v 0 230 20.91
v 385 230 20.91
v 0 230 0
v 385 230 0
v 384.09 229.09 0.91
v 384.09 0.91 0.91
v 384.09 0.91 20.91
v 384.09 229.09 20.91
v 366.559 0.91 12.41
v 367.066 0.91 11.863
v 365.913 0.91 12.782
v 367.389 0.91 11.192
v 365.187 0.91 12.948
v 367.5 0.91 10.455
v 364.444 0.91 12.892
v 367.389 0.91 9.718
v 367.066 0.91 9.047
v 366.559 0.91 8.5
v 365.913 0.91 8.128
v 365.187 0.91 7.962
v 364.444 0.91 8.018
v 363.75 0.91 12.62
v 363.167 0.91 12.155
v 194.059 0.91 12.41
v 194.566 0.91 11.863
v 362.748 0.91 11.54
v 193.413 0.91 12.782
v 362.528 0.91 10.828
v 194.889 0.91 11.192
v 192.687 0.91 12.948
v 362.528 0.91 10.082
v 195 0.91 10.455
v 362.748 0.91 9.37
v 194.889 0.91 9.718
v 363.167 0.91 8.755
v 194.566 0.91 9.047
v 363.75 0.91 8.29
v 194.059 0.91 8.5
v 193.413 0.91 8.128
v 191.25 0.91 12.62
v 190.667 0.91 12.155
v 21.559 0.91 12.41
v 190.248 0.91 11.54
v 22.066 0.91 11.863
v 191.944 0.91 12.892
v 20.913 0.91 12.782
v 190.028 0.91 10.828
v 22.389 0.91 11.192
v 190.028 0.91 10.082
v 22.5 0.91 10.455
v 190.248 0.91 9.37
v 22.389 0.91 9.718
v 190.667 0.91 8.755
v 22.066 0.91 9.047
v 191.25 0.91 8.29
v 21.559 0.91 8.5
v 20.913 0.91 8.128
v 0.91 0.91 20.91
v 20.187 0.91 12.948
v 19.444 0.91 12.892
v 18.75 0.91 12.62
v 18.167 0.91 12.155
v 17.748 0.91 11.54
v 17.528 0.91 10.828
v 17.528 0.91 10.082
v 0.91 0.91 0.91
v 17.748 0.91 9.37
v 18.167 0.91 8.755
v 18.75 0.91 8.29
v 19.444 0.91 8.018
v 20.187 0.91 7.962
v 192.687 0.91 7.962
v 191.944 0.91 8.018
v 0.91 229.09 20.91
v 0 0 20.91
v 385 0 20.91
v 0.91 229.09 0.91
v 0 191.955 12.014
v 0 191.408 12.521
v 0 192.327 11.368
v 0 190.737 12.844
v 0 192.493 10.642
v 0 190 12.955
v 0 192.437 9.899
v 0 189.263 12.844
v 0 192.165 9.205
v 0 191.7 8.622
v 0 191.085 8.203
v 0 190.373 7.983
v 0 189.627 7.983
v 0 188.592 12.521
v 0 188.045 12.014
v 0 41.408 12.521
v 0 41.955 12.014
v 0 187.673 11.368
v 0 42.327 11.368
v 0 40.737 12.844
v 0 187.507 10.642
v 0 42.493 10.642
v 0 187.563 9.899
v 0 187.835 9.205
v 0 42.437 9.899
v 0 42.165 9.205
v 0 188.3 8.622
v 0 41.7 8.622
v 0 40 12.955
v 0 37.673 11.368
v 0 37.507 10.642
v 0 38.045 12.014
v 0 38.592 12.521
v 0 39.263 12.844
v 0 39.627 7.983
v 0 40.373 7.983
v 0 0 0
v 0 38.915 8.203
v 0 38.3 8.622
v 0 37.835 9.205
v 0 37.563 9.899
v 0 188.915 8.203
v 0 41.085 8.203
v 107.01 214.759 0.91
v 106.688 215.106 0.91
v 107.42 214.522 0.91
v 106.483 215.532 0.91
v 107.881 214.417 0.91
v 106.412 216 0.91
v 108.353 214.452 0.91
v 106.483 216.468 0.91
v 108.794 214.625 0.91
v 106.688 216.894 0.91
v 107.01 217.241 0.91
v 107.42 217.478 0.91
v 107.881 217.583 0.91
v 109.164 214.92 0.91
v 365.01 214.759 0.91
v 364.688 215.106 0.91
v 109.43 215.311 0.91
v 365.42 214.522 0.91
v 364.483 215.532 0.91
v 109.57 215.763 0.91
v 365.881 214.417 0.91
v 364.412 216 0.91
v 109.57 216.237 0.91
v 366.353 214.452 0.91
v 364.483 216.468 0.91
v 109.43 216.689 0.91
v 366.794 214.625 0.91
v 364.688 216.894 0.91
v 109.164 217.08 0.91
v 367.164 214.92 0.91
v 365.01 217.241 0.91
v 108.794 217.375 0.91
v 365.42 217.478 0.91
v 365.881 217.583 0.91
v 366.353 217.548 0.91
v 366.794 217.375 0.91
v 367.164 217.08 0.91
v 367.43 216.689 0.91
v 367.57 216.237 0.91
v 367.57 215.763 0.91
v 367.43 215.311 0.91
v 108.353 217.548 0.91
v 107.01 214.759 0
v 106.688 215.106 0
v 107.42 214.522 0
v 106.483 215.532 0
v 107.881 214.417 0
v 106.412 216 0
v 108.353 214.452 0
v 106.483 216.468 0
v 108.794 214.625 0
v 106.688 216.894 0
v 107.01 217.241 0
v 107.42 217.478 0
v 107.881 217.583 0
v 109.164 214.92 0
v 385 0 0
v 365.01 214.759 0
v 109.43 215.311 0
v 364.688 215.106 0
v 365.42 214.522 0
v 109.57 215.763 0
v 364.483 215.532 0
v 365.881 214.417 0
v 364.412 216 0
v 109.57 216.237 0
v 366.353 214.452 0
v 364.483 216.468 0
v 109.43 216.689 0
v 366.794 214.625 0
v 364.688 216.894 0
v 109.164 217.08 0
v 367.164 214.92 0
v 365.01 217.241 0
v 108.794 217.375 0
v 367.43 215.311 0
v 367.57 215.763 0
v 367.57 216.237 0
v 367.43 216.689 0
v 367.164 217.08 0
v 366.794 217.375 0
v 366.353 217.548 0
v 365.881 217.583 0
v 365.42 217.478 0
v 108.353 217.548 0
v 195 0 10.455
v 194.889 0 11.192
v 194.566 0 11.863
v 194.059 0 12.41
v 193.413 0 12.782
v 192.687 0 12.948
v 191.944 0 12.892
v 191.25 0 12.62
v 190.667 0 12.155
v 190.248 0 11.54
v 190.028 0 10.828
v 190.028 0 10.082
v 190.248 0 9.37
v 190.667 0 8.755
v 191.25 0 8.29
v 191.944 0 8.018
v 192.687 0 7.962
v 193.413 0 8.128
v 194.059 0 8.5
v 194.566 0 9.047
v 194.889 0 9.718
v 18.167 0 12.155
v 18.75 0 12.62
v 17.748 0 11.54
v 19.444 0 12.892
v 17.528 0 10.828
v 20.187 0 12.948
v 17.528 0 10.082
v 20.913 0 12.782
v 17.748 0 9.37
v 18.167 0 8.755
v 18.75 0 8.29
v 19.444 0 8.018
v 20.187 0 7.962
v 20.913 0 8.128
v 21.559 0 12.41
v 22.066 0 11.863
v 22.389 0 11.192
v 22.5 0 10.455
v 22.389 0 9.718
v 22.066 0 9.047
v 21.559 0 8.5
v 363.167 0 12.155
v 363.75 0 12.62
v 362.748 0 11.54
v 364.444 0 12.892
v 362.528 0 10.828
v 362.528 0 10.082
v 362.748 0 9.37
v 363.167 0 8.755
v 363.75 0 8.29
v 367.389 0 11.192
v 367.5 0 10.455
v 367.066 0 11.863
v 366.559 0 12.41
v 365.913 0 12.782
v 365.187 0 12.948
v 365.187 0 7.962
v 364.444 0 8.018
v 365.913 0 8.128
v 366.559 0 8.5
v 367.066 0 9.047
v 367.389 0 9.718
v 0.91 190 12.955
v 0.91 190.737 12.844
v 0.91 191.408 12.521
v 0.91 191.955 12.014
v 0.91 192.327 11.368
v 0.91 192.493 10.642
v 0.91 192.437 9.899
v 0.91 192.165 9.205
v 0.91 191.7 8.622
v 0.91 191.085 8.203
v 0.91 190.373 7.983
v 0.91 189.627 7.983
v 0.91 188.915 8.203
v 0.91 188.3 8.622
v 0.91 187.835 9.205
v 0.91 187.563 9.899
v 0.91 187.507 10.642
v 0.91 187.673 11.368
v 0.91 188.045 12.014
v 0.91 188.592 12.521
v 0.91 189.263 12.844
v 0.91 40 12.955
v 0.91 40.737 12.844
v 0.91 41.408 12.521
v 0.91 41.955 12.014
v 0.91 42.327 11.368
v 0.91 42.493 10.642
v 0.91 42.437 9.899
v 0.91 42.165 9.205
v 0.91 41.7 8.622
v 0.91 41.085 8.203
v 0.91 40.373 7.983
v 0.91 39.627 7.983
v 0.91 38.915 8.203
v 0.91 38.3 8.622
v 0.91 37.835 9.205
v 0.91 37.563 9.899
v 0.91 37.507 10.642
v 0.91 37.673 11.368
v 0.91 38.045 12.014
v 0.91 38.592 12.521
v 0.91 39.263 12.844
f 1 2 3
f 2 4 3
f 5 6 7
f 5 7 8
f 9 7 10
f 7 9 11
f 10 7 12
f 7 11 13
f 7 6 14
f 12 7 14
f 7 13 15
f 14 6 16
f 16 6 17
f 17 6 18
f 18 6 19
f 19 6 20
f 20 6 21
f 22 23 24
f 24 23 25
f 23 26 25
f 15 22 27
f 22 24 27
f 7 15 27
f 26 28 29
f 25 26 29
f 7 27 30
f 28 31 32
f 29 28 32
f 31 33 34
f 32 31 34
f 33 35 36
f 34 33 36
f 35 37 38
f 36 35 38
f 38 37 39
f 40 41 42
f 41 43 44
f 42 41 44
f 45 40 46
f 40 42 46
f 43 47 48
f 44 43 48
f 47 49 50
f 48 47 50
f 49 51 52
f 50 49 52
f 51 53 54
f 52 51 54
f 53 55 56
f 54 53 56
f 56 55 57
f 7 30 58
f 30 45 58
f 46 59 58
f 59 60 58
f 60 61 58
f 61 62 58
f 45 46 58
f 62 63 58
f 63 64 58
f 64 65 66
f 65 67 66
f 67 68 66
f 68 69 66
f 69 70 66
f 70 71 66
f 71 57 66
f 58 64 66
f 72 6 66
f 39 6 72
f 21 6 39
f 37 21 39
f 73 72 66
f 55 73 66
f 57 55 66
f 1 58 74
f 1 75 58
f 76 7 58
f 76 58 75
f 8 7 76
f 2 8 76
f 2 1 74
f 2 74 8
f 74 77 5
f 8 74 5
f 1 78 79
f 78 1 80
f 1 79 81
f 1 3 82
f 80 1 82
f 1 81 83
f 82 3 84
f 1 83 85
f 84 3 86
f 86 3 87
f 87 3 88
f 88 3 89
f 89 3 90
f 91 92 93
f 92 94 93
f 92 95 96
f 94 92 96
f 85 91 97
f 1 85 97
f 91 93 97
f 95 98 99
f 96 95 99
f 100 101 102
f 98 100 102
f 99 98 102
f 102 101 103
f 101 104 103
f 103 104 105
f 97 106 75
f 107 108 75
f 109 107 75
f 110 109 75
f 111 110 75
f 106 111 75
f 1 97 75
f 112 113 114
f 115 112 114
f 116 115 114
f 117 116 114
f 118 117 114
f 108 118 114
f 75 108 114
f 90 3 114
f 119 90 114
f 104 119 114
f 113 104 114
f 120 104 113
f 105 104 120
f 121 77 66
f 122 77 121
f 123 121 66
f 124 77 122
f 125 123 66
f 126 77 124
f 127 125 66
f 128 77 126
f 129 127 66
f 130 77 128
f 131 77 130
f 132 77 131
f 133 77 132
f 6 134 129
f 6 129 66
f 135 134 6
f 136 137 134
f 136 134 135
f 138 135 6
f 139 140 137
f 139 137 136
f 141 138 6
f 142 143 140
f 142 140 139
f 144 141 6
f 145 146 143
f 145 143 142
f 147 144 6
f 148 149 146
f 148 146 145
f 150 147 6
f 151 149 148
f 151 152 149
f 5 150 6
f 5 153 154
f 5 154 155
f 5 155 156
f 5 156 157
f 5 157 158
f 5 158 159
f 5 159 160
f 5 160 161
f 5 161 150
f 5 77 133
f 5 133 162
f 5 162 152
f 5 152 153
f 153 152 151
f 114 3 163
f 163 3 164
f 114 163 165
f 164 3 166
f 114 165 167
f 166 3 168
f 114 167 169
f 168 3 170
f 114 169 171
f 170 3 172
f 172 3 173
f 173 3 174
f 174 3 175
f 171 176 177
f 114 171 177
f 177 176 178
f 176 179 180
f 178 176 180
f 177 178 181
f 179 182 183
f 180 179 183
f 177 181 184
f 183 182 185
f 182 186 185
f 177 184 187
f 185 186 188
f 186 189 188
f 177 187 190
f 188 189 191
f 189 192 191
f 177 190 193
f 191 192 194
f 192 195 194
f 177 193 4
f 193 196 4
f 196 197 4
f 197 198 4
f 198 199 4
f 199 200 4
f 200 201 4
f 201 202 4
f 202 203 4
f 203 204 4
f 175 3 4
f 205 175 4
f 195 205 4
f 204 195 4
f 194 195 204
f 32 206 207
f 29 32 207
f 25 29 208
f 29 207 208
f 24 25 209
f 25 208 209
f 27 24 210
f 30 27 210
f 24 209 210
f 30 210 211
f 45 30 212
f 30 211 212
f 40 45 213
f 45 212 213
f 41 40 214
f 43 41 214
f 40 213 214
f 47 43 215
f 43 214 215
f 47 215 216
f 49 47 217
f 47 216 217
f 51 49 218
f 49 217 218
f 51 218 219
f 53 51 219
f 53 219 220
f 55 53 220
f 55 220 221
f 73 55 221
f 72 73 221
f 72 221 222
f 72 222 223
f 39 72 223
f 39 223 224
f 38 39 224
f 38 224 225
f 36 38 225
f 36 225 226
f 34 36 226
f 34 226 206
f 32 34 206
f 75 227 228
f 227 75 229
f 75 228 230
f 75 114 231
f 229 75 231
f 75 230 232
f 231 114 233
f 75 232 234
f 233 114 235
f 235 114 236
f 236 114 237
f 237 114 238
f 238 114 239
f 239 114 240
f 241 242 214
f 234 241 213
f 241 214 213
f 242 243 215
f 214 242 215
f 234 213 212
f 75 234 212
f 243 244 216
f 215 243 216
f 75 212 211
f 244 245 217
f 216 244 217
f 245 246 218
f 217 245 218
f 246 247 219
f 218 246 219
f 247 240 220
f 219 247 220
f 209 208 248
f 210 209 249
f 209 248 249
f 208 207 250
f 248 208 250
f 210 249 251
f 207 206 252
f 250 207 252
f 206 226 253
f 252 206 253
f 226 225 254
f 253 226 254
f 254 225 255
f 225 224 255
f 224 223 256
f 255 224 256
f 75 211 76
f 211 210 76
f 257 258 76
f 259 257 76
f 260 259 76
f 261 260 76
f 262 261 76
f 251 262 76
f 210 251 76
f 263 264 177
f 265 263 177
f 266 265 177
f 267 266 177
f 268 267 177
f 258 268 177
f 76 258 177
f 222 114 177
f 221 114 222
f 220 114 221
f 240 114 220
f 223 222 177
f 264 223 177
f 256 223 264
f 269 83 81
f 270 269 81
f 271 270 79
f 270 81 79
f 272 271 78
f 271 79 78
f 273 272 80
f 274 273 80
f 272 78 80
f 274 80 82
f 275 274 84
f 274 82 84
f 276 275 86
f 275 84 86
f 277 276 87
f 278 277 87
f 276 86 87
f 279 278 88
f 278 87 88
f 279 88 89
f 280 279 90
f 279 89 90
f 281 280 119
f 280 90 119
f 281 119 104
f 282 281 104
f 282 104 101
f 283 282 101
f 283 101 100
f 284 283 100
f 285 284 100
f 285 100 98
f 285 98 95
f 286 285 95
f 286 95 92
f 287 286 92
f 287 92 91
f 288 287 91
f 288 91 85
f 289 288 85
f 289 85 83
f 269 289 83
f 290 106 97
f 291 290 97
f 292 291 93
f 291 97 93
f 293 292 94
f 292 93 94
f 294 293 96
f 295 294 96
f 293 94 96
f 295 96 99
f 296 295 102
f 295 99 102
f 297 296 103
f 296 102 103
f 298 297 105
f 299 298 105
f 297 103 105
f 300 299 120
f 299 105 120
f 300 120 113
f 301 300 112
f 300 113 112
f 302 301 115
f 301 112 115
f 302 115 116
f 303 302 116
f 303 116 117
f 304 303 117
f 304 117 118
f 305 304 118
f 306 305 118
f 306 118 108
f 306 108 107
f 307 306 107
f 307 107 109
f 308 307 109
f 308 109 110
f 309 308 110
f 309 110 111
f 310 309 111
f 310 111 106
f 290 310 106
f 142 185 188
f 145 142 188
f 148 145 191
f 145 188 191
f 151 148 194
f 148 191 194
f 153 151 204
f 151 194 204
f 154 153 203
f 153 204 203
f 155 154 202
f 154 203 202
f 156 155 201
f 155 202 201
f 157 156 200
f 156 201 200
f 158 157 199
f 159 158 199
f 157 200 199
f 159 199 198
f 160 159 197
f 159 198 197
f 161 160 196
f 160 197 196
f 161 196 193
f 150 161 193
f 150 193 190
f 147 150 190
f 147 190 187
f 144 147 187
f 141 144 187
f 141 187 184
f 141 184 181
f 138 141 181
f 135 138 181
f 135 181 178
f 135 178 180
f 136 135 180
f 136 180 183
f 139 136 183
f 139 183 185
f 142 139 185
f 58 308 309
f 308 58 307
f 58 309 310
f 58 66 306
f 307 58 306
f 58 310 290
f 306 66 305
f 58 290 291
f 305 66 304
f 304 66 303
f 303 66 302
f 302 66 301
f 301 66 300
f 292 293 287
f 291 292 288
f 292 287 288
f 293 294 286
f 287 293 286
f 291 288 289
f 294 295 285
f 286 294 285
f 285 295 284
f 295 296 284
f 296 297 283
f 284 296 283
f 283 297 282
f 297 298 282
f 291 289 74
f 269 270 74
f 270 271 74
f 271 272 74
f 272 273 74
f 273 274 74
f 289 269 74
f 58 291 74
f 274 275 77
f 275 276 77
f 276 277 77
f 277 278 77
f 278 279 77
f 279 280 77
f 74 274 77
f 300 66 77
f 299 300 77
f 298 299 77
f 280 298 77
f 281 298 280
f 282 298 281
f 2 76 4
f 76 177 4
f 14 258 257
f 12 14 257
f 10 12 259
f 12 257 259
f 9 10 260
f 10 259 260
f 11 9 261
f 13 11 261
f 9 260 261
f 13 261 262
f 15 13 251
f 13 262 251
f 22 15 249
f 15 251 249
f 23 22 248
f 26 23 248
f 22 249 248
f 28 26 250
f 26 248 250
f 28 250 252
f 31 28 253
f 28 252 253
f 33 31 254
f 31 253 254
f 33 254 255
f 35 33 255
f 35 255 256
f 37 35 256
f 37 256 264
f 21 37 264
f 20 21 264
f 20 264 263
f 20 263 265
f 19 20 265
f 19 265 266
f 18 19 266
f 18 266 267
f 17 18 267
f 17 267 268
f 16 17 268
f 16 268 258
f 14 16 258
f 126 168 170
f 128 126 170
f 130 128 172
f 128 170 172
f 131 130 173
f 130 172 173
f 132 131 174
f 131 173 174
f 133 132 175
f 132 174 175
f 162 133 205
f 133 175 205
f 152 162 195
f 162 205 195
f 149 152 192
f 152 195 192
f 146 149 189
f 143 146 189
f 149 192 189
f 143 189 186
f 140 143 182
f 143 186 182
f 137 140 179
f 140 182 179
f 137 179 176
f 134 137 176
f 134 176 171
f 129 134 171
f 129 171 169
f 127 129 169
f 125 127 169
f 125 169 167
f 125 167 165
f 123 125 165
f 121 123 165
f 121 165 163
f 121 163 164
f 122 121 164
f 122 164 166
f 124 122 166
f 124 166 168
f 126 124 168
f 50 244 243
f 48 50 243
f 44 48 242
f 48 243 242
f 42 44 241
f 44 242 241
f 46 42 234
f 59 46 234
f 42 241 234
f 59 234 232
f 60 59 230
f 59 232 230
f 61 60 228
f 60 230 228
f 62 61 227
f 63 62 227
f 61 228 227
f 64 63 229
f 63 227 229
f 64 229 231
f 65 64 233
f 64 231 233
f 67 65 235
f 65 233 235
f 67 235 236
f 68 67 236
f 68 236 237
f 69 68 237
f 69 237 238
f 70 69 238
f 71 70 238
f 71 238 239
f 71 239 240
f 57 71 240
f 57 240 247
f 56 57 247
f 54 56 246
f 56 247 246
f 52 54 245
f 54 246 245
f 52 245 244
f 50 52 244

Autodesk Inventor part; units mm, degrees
ref_plane "YZ Plane" through (0, 0, 0) normal (1, 0, 0) x (0, 1, 0)
sketch "Boceto1" plane through (0, 0, 0) normal (0, 0, 1) x (1, 0, 0)
  line L0 (0, 0) -> (385, 0)
  line L1 (385, 0) -> (385, 230)
  line L2 (385, 230) -> (0, 230)
  line L3 (0, 230) -> (0, 0)
  dimension "d0" = 385
  dimension "d1" = 230
extrude "Extrusión1" add sketch "Boceto1" along normal blind 0.91
sketch "Boceto2" plane through (0, 0, 0.91) normal (0, 0, 1) x (1, 0, 0)
  line L0 (385, 230) -> (0, 230) projected
  line L1 (0, 0) -> (0.76, 0)
  line L2 (0.91, 0.91) -> (0.91, 229.09)
  line L3 (0.91, 230) -> (0, 230)
  line L4 (0, 230) -> (0, 0)
  line L5 (0, 230) -> (0, 0) projected
  line L6 (385, 0) -> (385, 230) projected
  line L7 (0, 0) -> (385, 0)
  line L8 (385, 0) -> (385, 0.91)
  line L9 (384.09, 0.91) -> (0.91, 0.91)
  line L10 (0, 0.76) -> (0, 0)
  line L11 (0, 0) -> (385, 0) projected
  line L12 (385, 0) -> (384.24, 0)
  line L13 (384.09, 0.91) -> (384.09, 229.09)
  line L14 (384.09, 230) -> (385, 230)
  line L15 (385, 230) -> (385, 0)
  line L16 (385, 230) -> (0, 230)
  line L17 (0, 230) -> (0, 229.09)
  line L18 (0.91, 229.09) -> (384.09, 229.09)
  line L19 (385, 229.24) -> (385, 230)
  dimension "d36" = 0.91
  dimension "d37" = 0.91
  dimension "d38" = 0.91
  dimension "d39" = 0.91
extrude "Extrusión2" add sketch "Boceto2" along normal blind 20
sketch "Boceto3" plane through (0, 0, 0) normal (0, 0, -1) x (-1, 0, 0)
  line L0 (-384.09, 0.91) -> (-384.09, 229.09) projected
  line L1 (-0.91, 0.91) -> (-384.09, 0.91) projected
  line L2 (-365.39, 0.91) -> (-351.39, 0.91) construction
  circle A0 centre (-365.24, 14.76) radius 1
  line L3 (-385, 230) -> (-366, 230)
  line L4 (-385, 230) -> (0, 230) projected
  line L5 (-366, 230) -> (-366, 216)
  circle A1 centre (-366, 216) radius 1.5875
  line L6 (-366, 216) -> (-108, 216)
  circle A2 centre (-108, 216) radius 1.5875
  point P0 (0, 0)
  dimension "d14" = 19
  dimension "d15" = 14
  dimension "d16" = 90
  dimension "d17" = 3.175
  dimension "d18" = 258
  dimension "d19" = 3.175
extrude "Extrusión3" cut sketch "Boceto3" against normal through all contours A1 L6 L5 | A2 | L5 L6 A1
sketch "Boceto4" plane through (0, 0, 0) normal (0, -1, 0) x (1, 0, 0)
  line L0 (0, 0) -> (0, 20.91) construction
  line L1 (385, 0) -> (385, 20.91) construction
  line L2 (0, 10.455) -> (20, 10.455) construction
  circle A0 centre (20, 10.455) radius 2.5
  circle A1 centre (192.5, 10.455) radius 2.5
  circle A2 centre (365, 10.455) radius 2.5
  line L3 (384.09, 20.91) -> (0.91, 20.91) projected
  dimension "d25" = 5
  dimension "d26" = 5
  dimension "d27" = 5
  dimension "d41" = 20
  dimension "d42" = 20
ref_plane "Plano de trabajo1" through (1.52, 1.52, 0.76) normal (0, 1, 0) x (0, 0, 1)
extrude "Extrusión4" cut sketch "Boceto4" against normal up to surface (1.52 mm away)
sketch "Boceto5" plane through (0, 0, 0) normal (-1, 0, 0) x (0, 0, 1)
  line L0 (0, 0) -> (20.91, 0) construction
  line L1 (10.455, 0) -> (10.455, 230) construction
  line L2 (0, 230) -> (20.91, 230) construction
  line L3 (10.455, 0) -> (10.455, 40) construction
  line L4 (10.455, 230) -> (10.455, 190) construction
  circle A0 centre (10.455, 40) radius 2.5
  circle A1 centre (10.455, 190) radius 2.5
  dimension "d30" = 40
  dimension "d31" = 40
  dimension "d32" = 5
  dimension "d33" = 5
ref_plane "Plano de trabajo2" through (1.52, 1.52, 0.76) normal (1, 0, 0) x (0, 1, 0)
extrude "Extrusión5" cut sketch "Boceto5" against normal up to surface (1.52 mm away)
equation "\"d25\" = d27"
equation "\"d26\" = d27"
equation "\"d41\" = d42"
equation "\"d30\" = d31"
equation "\"d32\" = d33"
properties part number "Tapa_superior_derecha" material "Acero AISI 1006 85 LC"
